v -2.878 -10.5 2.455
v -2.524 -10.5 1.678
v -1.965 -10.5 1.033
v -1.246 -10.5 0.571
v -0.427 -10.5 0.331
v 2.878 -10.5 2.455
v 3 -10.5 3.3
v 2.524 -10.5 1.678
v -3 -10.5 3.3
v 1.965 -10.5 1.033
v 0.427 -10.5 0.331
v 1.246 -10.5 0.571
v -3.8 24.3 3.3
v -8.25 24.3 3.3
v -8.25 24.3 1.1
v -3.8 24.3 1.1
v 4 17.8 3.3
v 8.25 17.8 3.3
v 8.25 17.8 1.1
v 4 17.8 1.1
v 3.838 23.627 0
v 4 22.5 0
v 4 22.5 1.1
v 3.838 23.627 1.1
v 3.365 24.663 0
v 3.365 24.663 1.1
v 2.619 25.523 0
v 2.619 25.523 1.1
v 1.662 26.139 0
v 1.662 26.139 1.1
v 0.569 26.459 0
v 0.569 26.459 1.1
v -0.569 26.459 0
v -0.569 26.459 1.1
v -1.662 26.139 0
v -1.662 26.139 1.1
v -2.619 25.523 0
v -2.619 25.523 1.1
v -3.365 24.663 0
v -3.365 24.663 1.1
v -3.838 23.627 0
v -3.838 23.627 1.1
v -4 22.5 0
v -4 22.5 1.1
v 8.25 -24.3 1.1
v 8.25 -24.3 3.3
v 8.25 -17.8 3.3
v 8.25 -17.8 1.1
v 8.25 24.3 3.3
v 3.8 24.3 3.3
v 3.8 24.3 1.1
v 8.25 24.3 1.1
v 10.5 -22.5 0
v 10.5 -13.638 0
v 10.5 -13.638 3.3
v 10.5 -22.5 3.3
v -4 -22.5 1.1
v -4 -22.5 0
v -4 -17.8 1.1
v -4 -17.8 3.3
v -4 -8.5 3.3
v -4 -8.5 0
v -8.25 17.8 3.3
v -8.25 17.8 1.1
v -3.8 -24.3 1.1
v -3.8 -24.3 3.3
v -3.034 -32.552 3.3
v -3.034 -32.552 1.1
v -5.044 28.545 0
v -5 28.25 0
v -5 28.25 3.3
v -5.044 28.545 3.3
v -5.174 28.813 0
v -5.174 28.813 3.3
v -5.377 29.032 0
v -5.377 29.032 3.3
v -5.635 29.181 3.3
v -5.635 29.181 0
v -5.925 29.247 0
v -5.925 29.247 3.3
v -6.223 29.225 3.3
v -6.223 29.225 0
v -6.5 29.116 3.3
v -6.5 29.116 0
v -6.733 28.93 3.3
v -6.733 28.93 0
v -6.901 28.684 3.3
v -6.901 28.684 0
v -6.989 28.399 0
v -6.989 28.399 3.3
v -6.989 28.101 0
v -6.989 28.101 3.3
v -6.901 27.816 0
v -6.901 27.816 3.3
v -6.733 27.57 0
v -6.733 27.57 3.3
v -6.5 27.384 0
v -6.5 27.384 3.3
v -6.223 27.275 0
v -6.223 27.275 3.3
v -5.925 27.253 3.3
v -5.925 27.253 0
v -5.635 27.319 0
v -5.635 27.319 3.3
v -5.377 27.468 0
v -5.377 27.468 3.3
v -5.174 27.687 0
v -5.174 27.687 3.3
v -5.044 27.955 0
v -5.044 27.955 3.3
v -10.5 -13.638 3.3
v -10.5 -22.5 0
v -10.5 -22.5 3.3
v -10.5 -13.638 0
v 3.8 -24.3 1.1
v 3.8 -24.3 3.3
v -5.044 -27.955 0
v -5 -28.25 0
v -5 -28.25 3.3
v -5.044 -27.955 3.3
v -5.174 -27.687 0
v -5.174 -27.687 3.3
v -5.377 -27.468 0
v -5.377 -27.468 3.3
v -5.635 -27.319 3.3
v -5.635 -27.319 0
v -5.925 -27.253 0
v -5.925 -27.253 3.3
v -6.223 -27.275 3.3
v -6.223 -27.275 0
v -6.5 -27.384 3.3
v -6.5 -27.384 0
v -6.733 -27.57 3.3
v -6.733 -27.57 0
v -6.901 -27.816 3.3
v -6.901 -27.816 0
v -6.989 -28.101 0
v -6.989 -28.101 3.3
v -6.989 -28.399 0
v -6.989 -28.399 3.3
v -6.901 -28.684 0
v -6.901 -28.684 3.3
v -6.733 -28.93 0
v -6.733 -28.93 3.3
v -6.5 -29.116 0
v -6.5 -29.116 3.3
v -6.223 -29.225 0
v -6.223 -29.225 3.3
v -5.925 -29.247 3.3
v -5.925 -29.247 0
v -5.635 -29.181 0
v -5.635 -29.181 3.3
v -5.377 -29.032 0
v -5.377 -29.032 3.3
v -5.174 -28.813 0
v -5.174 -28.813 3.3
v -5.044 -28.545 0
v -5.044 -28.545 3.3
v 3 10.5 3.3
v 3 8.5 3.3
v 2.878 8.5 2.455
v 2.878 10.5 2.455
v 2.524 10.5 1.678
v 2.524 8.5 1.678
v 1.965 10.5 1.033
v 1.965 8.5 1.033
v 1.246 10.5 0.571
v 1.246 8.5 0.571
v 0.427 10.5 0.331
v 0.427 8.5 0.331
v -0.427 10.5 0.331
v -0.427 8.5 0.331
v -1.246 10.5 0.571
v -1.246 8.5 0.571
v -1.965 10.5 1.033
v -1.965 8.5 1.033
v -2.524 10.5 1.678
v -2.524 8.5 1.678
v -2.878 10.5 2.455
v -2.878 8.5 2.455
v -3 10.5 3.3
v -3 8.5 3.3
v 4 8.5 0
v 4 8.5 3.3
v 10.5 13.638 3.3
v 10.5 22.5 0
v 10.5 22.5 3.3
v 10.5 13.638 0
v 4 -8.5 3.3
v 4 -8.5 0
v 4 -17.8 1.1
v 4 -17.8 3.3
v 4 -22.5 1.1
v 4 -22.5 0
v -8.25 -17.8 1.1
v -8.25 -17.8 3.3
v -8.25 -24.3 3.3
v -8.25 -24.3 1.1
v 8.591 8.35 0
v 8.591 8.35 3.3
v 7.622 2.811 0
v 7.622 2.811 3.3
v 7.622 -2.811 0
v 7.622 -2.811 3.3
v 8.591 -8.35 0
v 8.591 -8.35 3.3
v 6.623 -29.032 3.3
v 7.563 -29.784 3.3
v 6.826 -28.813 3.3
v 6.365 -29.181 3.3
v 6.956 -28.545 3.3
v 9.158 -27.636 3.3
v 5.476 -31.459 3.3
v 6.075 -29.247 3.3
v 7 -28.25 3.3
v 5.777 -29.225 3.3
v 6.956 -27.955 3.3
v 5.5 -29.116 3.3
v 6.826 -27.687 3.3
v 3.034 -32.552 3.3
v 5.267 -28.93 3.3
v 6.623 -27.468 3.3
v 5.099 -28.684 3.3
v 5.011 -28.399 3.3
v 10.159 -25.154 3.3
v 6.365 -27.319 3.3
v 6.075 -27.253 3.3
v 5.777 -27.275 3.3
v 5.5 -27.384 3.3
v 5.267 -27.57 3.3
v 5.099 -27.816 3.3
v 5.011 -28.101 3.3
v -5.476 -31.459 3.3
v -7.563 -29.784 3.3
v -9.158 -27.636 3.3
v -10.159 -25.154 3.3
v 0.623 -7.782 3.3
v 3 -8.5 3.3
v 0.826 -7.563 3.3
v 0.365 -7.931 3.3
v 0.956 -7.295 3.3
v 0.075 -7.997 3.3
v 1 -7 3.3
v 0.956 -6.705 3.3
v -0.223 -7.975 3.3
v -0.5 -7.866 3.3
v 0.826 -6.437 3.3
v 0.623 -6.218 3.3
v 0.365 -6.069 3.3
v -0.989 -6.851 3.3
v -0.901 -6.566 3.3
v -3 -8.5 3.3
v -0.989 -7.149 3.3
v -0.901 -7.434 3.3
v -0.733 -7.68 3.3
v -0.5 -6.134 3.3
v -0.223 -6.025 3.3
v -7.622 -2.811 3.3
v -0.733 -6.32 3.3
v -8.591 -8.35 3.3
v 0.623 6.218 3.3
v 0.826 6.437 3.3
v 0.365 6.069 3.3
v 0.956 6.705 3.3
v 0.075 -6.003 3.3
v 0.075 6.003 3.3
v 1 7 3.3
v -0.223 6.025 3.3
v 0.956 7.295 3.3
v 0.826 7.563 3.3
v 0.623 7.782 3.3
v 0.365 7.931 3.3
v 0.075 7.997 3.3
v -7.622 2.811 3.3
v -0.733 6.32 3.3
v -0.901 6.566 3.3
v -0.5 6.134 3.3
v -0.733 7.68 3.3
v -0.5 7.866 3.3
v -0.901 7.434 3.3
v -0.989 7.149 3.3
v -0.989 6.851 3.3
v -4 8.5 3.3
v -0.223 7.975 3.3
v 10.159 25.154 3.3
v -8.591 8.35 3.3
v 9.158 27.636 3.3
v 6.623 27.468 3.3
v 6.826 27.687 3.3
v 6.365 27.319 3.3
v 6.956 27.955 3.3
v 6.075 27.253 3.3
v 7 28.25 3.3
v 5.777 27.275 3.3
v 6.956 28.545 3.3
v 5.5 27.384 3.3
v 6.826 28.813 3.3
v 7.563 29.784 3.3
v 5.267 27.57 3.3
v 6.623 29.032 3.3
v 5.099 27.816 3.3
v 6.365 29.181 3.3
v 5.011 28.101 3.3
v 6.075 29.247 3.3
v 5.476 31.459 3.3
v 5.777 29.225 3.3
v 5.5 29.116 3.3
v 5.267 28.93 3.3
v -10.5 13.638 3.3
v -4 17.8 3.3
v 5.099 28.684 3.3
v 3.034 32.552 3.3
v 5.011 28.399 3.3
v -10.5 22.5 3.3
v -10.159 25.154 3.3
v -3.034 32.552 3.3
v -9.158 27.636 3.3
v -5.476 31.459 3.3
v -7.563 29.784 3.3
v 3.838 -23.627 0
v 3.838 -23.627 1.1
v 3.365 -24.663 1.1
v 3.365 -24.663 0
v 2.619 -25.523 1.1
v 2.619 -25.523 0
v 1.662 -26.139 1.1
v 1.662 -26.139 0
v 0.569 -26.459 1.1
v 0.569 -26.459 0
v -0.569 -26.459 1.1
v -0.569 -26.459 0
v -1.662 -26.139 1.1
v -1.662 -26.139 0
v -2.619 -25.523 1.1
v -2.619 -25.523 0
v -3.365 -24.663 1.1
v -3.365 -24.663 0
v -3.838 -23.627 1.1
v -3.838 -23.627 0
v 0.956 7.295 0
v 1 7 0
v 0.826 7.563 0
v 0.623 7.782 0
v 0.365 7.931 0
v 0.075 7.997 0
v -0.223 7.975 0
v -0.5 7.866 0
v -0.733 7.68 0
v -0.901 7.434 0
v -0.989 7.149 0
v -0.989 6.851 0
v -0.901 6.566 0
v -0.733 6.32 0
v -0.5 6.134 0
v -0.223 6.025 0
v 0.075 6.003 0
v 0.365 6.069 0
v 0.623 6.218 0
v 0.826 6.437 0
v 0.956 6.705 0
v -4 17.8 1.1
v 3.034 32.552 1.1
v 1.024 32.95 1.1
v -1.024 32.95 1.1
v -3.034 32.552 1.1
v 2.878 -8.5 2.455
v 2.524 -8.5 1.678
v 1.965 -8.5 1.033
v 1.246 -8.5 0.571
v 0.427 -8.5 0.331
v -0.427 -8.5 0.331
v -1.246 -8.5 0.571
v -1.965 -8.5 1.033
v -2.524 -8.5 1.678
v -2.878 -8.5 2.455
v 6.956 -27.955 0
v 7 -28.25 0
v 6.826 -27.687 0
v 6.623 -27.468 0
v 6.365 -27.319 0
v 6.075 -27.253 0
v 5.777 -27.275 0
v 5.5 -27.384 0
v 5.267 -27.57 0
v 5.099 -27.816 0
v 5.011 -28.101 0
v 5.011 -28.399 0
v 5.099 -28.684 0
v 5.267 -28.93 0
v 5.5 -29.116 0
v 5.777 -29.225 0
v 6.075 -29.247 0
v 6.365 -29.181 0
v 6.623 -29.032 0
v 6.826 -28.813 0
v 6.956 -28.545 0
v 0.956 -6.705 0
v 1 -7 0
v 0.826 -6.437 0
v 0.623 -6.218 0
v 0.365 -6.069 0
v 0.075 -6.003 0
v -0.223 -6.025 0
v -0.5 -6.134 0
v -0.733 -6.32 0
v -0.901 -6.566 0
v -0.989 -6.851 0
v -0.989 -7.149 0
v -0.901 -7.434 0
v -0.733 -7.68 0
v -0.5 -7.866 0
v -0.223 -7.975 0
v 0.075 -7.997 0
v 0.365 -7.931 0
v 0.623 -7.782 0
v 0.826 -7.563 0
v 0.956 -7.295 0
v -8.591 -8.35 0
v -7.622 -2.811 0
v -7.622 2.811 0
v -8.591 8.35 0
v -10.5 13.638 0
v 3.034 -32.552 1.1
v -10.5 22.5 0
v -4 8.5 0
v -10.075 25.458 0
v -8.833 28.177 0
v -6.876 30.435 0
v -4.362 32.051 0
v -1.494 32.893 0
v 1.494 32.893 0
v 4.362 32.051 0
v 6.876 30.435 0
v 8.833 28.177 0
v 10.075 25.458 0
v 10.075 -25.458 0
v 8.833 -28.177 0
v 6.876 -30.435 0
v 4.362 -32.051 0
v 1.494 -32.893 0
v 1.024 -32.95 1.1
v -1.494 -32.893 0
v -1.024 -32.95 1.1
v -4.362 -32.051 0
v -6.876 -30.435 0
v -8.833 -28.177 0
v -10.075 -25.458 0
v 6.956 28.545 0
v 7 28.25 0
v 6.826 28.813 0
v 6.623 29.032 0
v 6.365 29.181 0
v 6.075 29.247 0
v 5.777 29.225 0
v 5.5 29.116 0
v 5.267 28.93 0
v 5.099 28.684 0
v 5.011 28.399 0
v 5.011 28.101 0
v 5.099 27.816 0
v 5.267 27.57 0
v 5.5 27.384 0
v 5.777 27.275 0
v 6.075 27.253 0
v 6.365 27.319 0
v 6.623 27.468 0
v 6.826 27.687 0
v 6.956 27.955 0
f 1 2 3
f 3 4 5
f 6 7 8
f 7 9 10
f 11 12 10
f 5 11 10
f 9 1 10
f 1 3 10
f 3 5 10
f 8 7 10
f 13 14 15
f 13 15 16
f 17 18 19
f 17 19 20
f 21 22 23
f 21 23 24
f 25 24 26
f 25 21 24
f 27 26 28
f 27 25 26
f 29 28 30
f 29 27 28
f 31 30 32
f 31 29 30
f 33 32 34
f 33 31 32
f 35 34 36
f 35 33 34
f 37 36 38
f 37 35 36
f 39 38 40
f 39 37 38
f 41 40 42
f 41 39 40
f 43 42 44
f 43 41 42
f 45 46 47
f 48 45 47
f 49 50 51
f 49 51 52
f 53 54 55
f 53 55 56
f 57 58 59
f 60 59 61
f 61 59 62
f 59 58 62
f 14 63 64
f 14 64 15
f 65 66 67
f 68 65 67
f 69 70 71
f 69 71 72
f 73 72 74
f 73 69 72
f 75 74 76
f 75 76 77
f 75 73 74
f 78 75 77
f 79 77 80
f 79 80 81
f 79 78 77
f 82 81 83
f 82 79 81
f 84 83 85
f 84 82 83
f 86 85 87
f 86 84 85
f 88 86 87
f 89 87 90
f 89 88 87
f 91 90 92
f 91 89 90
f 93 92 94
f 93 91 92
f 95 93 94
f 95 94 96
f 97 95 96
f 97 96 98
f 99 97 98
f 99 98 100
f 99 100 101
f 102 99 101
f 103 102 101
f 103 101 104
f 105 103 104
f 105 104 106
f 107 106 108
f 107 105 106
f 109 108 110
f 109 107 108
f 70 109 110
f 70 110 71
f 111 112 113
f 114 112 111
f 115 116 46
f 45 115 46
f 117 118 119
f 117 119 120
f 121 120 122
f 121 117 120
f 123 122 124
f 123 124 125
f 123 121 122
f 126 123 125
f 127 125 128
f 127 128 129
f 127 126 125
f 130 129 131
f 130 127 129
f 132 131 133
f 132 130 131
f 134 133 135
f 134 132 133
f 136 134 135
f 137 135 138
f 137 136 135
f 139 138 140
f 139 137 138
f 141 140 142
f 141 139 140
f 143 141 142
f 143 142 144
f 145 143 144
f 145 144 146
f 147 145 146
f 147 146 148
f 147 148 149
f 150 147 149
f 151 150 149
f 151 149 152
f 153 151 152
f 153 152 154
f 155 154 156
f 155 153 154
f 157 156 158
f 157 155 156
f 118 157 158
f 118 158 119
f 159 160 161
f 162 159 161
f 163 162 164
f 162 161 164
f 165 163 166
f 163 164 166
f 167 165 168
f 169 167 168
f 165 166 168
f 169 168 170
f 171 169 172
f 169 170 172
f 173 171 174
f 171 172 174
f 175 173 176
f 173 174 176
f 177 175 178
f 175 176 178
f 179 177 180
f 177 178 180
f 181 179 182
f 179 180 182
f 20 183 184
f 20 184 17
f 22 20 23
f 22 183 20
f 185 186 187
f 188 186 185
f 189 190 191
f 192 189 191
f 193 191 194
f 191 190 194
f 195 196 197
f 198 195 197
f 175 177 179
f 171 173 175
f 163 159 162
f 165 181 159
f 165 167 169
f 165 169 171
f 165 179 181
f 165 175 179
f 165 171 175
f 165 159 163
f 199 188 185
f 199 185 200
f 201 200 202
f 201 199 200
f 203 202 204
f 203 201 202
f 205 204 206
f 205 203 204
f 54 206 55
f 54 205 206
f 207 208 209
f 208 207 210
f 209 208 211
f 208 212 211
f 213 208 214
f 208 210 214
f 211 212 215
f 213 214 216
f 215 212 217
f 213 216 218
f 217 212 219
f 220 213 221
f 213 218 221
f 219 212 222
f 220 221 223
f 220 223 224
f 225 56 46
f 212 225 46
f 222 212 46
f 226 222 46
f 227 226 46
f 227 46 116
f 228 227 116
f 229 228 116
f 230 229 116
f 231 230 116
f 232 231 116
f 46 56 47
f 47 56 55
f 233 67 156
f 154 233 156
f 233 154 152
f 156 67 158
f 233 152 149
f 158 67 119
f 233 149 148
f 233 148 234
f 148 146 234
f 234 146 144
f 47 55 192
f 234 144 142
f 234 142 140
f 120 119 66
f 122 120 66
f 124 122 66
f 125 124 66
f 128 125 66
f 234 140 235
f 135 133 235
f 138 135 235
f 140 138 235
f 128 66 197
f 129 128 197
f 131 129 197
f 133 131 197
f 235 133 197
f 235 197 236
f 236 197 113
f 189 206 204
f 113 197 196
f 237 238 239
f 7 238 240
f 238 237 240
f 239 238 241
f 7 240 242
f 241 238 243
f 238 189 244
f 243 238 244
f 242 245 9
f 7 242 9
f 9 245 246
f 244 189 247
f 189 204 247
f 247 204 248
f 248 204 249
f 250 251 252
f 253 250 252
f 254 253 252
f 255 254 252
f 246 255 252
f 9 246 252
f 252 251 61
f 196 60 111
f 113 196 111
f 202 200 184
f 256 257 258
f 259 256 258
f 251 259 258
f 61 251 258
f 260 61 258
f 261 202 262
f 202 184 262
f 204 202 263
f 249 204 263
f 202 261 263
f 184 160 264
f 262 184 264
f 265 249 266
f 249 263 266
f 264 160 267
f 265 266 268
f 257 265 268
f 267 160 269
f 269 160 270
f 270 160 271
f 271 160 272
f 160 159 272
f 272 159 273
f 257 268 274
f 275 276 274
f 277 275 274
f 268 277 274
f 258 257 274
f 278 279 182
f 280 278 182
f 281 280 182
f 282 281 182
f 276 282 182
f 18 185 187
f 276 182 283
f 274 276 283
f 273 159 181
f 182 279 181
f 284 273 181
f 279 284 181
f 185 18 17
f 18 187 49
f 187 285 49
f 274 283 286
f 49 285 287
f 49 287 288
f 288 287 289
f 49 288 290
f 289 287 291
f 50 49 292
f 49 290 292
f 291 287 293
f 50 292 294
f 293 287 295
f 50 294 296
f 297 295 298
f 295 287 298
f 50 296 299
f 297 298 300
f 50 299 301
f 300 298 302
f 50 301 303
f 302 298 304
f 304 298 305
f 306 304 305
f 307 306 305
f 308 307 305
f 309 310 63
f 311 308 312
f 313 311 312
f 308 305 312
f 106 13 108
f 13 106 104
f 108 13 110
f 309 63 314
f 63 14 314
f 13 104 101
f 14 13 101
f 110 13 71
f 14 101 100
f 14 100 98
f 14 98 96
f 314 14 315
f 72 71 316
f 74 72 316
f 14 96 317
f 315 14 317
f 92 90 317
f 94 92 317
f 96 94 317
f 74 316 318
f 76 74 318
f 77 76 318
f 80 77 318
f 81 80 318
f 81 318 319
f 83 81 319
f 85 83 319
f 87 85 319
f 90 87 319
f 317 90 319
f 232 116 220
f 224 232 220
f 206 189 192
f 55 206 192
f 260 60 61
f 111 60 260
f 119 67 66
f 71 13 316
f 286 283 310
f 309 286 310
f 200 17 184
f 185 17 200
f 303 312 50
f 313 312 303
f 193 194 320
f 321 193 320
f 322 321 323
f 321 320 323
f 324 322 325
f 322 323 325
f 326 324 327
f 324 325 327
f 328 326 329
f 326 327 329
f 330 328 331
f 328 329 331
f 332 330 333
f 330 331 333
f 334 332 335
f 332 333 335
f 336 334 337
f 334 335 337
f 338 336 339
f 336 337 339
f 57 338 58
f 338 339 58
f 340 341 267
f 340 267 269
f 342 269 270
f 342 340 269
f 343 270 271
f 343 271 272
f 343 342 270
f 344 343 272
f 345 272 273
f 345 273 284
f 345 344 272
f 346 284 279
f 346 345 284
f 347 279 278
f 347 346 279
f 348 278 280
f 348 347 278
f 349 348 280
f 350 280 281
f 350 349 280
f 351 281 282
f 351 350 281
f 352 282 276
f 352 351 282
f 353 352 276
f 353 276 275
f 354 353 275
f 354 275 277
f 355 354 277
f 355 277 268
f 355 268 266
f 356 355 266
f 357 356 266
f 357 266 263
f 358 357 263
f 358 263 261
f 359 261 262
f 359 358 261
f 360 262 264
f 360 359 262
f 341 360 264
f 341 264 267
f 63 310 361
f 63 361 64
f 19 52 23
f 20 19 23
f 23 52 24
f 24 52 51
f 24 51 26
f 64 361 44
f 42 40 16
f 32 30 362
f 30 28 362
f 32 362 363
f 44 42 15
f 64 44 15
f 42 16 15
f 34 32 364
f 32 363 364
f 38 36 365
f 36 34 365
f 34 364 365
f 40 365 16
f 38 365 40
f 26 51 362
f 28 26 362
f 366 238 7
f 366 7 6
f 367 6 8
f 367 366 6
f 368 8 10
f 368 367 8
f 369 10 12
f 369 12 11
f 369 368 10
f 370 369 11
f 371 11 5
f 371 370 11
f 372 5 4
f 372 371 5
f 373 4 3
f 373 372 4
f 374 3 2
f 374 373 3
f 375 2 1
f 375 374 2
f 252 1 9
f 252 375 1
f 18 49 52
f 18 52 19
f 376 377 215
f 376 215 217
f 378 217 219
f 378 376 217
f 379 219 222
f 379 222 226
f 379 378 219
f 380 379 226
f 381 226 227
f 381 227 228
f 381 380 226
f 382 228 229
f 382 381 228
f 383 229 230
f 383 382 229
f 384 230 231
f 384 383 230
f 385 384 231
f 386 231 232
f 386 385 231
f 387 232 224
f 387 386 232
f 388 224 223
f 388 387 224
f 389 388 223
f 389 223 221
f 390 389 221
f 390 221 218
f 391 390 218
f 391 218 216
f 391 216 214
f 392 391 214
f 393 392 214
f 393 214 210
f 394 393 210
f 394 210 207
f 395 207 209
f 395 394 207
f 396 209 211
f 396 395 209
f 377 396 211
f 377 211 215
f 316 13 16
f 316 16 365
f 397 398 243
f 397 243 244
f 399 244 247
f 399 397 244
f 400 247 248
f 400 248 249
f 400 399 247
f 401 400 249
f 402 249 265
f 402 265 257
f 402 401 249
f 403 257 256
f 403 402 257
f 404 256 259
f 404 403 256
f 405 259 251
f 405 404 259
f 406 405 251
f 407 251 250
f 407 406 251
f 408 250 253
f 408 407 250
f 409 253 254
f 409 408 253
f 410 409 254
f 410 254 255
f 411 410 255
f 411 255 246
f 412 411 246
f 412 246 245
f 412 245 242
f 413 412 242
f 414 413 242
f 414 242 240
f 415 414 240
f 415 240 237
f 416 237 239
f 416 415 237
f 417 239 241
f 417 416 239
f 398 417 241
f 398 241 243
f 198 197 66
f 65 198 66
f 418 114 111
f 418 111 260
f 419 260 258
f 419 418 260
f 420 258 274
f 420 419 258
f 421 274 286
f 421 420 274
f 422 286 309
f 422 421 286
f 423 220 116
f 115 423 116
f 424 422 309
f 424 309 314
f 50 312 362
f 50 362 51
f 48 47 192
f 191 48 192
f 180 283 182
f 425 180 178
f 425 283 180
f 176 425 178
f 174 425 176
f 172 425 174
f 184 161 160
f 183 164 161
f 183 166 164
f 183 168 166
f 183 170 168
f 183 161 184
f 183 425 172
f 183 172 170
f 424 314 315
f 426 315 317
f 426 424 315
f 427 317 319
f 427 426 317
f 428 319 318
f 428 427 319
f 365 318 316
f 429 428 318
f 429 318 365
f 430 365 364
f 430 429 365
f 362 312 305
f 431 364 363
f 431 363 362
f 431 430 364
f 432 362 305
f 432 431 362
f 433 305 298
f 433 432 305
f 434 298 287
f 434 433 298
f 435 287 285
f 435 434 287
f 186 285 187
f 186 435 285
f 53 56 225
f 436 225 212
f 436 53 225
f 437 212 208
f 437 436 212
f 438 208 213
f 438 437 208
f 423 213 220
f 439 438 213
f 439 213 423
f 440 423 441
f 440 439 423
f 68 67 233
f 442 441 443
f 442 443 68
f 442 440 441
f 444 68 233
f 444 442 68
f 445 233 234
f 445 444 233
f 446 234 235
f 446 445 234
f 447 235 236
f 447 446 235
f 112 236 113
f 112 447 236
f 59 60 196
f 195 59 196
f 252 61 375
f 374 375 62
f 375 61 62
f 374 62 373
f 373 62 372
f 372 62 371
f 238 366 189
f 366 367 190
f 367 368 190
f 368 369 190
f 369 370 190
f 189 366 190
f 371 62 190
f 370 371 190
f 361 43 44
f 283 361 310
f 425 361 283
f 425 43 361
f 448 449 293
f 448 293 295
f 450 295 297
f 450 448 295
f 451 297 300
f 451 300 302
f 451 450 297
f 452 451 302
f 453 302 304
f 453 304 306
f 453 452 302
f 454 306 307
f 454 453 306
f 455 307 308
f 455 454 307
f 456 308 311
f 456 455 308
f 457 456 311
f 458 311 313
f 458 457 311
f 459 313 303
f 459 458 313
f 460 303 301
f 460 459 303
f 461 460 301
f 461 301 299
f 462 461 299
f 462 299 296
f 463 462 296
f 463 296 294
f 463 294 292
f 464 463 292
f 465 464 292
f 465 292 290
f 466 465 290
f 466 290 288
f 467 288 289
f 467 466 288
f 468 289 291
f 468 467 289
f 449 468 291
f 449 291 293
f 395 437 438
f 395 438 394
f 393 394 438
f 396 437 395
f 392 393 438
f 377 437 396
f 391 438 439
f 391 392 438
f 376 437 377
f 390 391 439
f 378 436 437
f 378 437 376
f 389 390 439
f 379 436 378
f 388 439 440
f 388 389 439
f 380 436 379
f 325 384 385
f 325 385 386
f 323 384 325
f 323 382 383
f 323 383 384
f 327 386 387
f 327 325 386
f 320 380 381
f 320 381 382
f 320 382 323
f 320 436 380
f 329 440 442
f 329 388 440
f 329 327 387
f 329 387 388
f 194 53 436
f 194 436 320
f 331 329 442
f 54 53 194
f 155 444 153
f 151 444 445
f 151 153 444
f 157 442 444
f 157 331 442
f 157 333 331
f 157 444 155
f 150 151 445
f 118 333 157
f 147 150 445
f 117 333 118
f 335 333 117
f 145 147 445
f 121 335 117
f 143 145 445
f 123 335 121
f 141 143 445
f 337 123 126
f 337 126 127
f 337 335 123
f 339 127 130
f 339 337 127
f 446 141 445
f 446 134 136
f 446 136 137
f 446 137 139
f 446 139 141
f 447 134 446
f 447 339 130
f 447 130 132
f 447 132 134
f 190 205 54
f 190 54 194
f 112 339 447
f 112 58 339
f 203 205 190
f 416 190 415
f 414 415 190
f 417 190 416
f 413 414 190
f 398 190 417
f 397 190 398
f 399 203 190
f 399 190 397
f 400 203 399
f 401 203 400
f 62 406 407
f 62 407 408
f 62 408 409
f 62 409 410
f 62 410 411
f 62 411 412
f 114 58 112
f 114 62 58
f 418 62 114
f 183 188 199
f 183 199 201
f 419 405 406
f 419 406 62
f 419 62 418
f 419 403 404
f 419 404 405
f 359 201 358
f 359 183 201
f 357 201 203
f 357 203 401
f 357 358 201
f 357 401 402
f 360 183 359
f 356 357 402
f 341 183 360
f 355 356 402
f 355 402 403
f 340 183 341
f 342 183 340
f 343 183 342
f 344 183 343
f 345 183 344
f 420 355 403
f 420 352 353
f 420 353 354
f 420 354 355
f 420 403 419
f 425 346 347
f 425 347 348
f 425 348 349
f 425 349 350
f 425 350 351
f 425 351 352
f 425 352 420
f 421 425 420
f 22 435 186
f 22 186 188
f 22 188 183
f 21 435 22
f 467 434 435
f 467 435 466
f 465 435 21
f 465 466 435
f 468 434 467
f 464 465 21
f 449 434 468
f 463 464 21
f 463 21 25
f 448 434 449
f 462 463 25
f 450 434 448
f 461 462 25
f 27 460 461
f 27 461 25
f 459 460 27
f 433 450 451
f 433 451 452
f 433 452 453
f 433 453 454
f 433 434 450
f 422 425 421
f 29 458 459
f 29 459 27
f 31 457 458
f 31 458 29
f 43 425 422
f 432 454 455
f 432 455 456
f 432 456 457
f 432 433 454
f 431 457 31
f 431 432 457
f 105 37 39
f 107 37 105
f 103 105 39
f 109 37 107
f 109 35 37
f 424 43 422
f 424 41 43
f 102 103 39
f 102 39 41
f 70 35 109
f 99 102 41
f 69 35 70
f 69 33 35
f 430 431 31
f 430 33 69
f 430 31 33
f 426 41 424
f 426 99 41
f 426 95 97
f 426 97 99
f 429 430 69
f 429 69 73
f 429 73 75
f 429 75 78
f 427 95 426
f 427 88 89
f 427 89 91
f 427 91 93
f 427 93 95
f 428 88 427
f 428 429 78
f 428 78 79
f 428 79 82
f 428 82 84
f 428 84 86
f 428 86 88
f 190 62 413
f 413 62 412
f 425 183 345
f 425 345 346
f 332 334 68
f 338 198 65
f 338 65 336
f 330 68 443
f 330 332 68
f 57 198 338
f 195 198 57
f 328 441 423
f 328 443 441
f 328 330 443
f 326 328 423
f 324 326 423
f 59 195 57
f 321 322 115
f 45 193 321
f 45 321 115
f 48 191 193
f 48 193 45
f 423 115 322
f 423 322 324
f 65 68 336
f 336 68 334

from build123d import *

# Parameters (mm, degrees)
SKETCH_1_R          = 1
EXTRUDE_1_DEPTH     = 3.3
CUT_EXTRUDE_1_DEPTH = 2.2
EXTRUDE_2_DEPTH     = 2


with BuildPart() as part:
    # 草图1 → 凸台-拉伸1 (new body)
    with BuildSketch(Plane.XY):
        with BuildLine():
            Line((10.5, -13.638181697), (10.5, -22.5))
            ThreePointArc((10.5, -22.5), (0, -33), (-10.5, -22.5))
            Line((-10.5, -22.5), (-10.5, -13.638181697))
            ThreePointArc((-10.5, -13.638181697), (-7.5, 0), (-10.5, 13.638181697))
            Line((-10.5, 13.638181697), (-10.5, 22.5))
            ThreePointArc((-10.5, 22.5), (0, 33), (10.5, 22.5))
            Line((10.5, 22.5), (10.5, 13.638181697))
            ThreePointArc((10.5, 13.638181697), (7.5, 0), (10.5, -13.638181697))
        make_face()
        with Locations((0, 7)):
            Circle(SKETCH_1_R, mode=Mode.SUBTRACT)
        with Locations((0, -7)):
            Circle(SKETCH_1_R, mode=Mode.SUBTRACT)
        with Locations((-6, 28.25)):
            Circle(SKETCH_1_R, mode=Mode.SUBTRACT)
        with Locations((6, 28.25)):
            Circle(SKETCH_1_R, mode=Mode.SUBTRACT)
        with Locations((6, -28.25)):
            Circle(SKETCH_1_R, mode=Mode.SUBTRACT)
        with Locations((-6, -28.25)):
            Circle(SKETCH_1_R, mode=Mode.SUBTRACT)
        with BuildLine():
            Line((-4, -22.499999544), (-4, -8.5))
            Line((-4, -8.5), (4, -8.5))
            Line((4, -8.5), (4, -22.500000456))
            ThreePointArc((4, -22.500000456), (-4.56e-07, -26.5), (-4, -22.499999544))
        make_face(mode=Mode.SUBTRACT)
        with BuildLine():
            Line((-4, 22.499999544), (-4, 8.5))
            Line((-4, 8.5), (4, 8.5))
            Line((4, 8.5), (4, 22.500000456))
            ThreePointArc((4, 22.500000456), (-4.56e-07, 26.5), (-4, 22.499999544))
        make_face(mode=Mode.SUBTRACT)
    extrude(amount=EXTRUDE_1_DEPTH)

    # 草图2 → 切除-拉伸1 (cut)
    with BuildSketch(Plane.XY.offset(3.3)):
        Polygon((-3.8, 24.3), (-2.871447866, 34.3), (2.871447866, 34.3), (3.8, 24.3), (8.25, 24.3), (8.25, 17.8), (-8.25, 17.8), (-8.25, 24.3), align=None)
        Polygon((3.8, -24.3), (8.25, -24.3), (8.25, -17.8), (-8.25, -17.8), (-8.25, -24.3), (-3.8, -24.3), (-2.871447866, -34.3), (2.871447866, -34.3), align=None)
    extrude(amount=-CUT_EXTRUDE_1_DEPTH, mode=Mode.SUBTRACT)

    # 草图3 → 凸台-拉伸2 (add)
    with BuildSketch(Plane(origin=(0, 8.5, 0), x_dir=(1, 0, 0), z_dir=(0, 1, 0))):
        with BuildLine():
            Line((-3, -3.3), (3, -3.3))
            ThreePointArc((3, -3.3), (0, -0.3), (-3, -3.3))
        make_face()
    extrude_2 = extrude(amount=EXTRUDE_2_DEPTH)

    # 镜向1: 凸台-拉伸2 across plane
    add(extrude_2.mirror(Plane.ZX))


solid = part.part
